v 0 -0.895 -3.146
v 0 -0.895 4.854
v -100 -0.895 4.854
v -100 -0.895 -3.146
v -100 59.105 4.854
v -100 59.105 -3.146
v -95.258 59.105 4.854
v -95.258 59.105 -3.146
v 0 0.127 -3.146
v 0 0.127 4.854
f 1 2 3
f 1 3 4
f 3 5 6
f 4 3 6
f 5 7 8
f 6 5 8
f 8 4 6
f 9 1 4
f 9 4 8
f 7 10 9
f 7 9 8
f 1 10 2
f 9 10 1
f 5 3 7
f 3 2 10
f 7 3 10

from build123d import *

# Parameters (mm, degrees)
ESQUISSE1_W             = 8
ESQUISSE1_H             = 60
BOSS_EXTRU_1_DEPTH      = 100
ENL_V_MAT_EXTRU_1_REACH = 10


with BuildPart() as part:
    # Esquisse1 → Boss.-Extru.1 (new body)
    with BuildSketch(Plane(origin=(0, 0, 0), x_dir=(0, 0, -1), z_dir=(1, 0, 0))):
        with Locations((-0.854369973, 29.104551848)):
            Rectangle(ESQUISSE1_W, ESQUISSE1_H)
    extrude(amount=-BOSS_EXTRU_1_DEPTH)

    # Esquisse2 → Enlèv. mat.-Extru.1 (cut, up to next)
    with BuildSketch(Plane.XY.offset(4.854369973), mode=Mode.PRIVATE) as enl_v_mat_extru_1_sk1:
        Polygon((-96, 59.563838708), (1.070476381, 60.732011114), (2.184337253, -1.224933167), align=None)
    enl_v_mat_extru_1_tool1 = extrude(enl_v_mat_extru_1_sk1.sketch, amount=-ENL_V_MAT_EXTRU_1_REACH, mode=Mode.PRIVATE) & part.part
    add(enl_v_mat_extru_1_tool1.solids().sort_by_distance((-30.915062, 39.690306, 4.85437))[0], mode=Mode.SUBTRACT)


solid = part.part
